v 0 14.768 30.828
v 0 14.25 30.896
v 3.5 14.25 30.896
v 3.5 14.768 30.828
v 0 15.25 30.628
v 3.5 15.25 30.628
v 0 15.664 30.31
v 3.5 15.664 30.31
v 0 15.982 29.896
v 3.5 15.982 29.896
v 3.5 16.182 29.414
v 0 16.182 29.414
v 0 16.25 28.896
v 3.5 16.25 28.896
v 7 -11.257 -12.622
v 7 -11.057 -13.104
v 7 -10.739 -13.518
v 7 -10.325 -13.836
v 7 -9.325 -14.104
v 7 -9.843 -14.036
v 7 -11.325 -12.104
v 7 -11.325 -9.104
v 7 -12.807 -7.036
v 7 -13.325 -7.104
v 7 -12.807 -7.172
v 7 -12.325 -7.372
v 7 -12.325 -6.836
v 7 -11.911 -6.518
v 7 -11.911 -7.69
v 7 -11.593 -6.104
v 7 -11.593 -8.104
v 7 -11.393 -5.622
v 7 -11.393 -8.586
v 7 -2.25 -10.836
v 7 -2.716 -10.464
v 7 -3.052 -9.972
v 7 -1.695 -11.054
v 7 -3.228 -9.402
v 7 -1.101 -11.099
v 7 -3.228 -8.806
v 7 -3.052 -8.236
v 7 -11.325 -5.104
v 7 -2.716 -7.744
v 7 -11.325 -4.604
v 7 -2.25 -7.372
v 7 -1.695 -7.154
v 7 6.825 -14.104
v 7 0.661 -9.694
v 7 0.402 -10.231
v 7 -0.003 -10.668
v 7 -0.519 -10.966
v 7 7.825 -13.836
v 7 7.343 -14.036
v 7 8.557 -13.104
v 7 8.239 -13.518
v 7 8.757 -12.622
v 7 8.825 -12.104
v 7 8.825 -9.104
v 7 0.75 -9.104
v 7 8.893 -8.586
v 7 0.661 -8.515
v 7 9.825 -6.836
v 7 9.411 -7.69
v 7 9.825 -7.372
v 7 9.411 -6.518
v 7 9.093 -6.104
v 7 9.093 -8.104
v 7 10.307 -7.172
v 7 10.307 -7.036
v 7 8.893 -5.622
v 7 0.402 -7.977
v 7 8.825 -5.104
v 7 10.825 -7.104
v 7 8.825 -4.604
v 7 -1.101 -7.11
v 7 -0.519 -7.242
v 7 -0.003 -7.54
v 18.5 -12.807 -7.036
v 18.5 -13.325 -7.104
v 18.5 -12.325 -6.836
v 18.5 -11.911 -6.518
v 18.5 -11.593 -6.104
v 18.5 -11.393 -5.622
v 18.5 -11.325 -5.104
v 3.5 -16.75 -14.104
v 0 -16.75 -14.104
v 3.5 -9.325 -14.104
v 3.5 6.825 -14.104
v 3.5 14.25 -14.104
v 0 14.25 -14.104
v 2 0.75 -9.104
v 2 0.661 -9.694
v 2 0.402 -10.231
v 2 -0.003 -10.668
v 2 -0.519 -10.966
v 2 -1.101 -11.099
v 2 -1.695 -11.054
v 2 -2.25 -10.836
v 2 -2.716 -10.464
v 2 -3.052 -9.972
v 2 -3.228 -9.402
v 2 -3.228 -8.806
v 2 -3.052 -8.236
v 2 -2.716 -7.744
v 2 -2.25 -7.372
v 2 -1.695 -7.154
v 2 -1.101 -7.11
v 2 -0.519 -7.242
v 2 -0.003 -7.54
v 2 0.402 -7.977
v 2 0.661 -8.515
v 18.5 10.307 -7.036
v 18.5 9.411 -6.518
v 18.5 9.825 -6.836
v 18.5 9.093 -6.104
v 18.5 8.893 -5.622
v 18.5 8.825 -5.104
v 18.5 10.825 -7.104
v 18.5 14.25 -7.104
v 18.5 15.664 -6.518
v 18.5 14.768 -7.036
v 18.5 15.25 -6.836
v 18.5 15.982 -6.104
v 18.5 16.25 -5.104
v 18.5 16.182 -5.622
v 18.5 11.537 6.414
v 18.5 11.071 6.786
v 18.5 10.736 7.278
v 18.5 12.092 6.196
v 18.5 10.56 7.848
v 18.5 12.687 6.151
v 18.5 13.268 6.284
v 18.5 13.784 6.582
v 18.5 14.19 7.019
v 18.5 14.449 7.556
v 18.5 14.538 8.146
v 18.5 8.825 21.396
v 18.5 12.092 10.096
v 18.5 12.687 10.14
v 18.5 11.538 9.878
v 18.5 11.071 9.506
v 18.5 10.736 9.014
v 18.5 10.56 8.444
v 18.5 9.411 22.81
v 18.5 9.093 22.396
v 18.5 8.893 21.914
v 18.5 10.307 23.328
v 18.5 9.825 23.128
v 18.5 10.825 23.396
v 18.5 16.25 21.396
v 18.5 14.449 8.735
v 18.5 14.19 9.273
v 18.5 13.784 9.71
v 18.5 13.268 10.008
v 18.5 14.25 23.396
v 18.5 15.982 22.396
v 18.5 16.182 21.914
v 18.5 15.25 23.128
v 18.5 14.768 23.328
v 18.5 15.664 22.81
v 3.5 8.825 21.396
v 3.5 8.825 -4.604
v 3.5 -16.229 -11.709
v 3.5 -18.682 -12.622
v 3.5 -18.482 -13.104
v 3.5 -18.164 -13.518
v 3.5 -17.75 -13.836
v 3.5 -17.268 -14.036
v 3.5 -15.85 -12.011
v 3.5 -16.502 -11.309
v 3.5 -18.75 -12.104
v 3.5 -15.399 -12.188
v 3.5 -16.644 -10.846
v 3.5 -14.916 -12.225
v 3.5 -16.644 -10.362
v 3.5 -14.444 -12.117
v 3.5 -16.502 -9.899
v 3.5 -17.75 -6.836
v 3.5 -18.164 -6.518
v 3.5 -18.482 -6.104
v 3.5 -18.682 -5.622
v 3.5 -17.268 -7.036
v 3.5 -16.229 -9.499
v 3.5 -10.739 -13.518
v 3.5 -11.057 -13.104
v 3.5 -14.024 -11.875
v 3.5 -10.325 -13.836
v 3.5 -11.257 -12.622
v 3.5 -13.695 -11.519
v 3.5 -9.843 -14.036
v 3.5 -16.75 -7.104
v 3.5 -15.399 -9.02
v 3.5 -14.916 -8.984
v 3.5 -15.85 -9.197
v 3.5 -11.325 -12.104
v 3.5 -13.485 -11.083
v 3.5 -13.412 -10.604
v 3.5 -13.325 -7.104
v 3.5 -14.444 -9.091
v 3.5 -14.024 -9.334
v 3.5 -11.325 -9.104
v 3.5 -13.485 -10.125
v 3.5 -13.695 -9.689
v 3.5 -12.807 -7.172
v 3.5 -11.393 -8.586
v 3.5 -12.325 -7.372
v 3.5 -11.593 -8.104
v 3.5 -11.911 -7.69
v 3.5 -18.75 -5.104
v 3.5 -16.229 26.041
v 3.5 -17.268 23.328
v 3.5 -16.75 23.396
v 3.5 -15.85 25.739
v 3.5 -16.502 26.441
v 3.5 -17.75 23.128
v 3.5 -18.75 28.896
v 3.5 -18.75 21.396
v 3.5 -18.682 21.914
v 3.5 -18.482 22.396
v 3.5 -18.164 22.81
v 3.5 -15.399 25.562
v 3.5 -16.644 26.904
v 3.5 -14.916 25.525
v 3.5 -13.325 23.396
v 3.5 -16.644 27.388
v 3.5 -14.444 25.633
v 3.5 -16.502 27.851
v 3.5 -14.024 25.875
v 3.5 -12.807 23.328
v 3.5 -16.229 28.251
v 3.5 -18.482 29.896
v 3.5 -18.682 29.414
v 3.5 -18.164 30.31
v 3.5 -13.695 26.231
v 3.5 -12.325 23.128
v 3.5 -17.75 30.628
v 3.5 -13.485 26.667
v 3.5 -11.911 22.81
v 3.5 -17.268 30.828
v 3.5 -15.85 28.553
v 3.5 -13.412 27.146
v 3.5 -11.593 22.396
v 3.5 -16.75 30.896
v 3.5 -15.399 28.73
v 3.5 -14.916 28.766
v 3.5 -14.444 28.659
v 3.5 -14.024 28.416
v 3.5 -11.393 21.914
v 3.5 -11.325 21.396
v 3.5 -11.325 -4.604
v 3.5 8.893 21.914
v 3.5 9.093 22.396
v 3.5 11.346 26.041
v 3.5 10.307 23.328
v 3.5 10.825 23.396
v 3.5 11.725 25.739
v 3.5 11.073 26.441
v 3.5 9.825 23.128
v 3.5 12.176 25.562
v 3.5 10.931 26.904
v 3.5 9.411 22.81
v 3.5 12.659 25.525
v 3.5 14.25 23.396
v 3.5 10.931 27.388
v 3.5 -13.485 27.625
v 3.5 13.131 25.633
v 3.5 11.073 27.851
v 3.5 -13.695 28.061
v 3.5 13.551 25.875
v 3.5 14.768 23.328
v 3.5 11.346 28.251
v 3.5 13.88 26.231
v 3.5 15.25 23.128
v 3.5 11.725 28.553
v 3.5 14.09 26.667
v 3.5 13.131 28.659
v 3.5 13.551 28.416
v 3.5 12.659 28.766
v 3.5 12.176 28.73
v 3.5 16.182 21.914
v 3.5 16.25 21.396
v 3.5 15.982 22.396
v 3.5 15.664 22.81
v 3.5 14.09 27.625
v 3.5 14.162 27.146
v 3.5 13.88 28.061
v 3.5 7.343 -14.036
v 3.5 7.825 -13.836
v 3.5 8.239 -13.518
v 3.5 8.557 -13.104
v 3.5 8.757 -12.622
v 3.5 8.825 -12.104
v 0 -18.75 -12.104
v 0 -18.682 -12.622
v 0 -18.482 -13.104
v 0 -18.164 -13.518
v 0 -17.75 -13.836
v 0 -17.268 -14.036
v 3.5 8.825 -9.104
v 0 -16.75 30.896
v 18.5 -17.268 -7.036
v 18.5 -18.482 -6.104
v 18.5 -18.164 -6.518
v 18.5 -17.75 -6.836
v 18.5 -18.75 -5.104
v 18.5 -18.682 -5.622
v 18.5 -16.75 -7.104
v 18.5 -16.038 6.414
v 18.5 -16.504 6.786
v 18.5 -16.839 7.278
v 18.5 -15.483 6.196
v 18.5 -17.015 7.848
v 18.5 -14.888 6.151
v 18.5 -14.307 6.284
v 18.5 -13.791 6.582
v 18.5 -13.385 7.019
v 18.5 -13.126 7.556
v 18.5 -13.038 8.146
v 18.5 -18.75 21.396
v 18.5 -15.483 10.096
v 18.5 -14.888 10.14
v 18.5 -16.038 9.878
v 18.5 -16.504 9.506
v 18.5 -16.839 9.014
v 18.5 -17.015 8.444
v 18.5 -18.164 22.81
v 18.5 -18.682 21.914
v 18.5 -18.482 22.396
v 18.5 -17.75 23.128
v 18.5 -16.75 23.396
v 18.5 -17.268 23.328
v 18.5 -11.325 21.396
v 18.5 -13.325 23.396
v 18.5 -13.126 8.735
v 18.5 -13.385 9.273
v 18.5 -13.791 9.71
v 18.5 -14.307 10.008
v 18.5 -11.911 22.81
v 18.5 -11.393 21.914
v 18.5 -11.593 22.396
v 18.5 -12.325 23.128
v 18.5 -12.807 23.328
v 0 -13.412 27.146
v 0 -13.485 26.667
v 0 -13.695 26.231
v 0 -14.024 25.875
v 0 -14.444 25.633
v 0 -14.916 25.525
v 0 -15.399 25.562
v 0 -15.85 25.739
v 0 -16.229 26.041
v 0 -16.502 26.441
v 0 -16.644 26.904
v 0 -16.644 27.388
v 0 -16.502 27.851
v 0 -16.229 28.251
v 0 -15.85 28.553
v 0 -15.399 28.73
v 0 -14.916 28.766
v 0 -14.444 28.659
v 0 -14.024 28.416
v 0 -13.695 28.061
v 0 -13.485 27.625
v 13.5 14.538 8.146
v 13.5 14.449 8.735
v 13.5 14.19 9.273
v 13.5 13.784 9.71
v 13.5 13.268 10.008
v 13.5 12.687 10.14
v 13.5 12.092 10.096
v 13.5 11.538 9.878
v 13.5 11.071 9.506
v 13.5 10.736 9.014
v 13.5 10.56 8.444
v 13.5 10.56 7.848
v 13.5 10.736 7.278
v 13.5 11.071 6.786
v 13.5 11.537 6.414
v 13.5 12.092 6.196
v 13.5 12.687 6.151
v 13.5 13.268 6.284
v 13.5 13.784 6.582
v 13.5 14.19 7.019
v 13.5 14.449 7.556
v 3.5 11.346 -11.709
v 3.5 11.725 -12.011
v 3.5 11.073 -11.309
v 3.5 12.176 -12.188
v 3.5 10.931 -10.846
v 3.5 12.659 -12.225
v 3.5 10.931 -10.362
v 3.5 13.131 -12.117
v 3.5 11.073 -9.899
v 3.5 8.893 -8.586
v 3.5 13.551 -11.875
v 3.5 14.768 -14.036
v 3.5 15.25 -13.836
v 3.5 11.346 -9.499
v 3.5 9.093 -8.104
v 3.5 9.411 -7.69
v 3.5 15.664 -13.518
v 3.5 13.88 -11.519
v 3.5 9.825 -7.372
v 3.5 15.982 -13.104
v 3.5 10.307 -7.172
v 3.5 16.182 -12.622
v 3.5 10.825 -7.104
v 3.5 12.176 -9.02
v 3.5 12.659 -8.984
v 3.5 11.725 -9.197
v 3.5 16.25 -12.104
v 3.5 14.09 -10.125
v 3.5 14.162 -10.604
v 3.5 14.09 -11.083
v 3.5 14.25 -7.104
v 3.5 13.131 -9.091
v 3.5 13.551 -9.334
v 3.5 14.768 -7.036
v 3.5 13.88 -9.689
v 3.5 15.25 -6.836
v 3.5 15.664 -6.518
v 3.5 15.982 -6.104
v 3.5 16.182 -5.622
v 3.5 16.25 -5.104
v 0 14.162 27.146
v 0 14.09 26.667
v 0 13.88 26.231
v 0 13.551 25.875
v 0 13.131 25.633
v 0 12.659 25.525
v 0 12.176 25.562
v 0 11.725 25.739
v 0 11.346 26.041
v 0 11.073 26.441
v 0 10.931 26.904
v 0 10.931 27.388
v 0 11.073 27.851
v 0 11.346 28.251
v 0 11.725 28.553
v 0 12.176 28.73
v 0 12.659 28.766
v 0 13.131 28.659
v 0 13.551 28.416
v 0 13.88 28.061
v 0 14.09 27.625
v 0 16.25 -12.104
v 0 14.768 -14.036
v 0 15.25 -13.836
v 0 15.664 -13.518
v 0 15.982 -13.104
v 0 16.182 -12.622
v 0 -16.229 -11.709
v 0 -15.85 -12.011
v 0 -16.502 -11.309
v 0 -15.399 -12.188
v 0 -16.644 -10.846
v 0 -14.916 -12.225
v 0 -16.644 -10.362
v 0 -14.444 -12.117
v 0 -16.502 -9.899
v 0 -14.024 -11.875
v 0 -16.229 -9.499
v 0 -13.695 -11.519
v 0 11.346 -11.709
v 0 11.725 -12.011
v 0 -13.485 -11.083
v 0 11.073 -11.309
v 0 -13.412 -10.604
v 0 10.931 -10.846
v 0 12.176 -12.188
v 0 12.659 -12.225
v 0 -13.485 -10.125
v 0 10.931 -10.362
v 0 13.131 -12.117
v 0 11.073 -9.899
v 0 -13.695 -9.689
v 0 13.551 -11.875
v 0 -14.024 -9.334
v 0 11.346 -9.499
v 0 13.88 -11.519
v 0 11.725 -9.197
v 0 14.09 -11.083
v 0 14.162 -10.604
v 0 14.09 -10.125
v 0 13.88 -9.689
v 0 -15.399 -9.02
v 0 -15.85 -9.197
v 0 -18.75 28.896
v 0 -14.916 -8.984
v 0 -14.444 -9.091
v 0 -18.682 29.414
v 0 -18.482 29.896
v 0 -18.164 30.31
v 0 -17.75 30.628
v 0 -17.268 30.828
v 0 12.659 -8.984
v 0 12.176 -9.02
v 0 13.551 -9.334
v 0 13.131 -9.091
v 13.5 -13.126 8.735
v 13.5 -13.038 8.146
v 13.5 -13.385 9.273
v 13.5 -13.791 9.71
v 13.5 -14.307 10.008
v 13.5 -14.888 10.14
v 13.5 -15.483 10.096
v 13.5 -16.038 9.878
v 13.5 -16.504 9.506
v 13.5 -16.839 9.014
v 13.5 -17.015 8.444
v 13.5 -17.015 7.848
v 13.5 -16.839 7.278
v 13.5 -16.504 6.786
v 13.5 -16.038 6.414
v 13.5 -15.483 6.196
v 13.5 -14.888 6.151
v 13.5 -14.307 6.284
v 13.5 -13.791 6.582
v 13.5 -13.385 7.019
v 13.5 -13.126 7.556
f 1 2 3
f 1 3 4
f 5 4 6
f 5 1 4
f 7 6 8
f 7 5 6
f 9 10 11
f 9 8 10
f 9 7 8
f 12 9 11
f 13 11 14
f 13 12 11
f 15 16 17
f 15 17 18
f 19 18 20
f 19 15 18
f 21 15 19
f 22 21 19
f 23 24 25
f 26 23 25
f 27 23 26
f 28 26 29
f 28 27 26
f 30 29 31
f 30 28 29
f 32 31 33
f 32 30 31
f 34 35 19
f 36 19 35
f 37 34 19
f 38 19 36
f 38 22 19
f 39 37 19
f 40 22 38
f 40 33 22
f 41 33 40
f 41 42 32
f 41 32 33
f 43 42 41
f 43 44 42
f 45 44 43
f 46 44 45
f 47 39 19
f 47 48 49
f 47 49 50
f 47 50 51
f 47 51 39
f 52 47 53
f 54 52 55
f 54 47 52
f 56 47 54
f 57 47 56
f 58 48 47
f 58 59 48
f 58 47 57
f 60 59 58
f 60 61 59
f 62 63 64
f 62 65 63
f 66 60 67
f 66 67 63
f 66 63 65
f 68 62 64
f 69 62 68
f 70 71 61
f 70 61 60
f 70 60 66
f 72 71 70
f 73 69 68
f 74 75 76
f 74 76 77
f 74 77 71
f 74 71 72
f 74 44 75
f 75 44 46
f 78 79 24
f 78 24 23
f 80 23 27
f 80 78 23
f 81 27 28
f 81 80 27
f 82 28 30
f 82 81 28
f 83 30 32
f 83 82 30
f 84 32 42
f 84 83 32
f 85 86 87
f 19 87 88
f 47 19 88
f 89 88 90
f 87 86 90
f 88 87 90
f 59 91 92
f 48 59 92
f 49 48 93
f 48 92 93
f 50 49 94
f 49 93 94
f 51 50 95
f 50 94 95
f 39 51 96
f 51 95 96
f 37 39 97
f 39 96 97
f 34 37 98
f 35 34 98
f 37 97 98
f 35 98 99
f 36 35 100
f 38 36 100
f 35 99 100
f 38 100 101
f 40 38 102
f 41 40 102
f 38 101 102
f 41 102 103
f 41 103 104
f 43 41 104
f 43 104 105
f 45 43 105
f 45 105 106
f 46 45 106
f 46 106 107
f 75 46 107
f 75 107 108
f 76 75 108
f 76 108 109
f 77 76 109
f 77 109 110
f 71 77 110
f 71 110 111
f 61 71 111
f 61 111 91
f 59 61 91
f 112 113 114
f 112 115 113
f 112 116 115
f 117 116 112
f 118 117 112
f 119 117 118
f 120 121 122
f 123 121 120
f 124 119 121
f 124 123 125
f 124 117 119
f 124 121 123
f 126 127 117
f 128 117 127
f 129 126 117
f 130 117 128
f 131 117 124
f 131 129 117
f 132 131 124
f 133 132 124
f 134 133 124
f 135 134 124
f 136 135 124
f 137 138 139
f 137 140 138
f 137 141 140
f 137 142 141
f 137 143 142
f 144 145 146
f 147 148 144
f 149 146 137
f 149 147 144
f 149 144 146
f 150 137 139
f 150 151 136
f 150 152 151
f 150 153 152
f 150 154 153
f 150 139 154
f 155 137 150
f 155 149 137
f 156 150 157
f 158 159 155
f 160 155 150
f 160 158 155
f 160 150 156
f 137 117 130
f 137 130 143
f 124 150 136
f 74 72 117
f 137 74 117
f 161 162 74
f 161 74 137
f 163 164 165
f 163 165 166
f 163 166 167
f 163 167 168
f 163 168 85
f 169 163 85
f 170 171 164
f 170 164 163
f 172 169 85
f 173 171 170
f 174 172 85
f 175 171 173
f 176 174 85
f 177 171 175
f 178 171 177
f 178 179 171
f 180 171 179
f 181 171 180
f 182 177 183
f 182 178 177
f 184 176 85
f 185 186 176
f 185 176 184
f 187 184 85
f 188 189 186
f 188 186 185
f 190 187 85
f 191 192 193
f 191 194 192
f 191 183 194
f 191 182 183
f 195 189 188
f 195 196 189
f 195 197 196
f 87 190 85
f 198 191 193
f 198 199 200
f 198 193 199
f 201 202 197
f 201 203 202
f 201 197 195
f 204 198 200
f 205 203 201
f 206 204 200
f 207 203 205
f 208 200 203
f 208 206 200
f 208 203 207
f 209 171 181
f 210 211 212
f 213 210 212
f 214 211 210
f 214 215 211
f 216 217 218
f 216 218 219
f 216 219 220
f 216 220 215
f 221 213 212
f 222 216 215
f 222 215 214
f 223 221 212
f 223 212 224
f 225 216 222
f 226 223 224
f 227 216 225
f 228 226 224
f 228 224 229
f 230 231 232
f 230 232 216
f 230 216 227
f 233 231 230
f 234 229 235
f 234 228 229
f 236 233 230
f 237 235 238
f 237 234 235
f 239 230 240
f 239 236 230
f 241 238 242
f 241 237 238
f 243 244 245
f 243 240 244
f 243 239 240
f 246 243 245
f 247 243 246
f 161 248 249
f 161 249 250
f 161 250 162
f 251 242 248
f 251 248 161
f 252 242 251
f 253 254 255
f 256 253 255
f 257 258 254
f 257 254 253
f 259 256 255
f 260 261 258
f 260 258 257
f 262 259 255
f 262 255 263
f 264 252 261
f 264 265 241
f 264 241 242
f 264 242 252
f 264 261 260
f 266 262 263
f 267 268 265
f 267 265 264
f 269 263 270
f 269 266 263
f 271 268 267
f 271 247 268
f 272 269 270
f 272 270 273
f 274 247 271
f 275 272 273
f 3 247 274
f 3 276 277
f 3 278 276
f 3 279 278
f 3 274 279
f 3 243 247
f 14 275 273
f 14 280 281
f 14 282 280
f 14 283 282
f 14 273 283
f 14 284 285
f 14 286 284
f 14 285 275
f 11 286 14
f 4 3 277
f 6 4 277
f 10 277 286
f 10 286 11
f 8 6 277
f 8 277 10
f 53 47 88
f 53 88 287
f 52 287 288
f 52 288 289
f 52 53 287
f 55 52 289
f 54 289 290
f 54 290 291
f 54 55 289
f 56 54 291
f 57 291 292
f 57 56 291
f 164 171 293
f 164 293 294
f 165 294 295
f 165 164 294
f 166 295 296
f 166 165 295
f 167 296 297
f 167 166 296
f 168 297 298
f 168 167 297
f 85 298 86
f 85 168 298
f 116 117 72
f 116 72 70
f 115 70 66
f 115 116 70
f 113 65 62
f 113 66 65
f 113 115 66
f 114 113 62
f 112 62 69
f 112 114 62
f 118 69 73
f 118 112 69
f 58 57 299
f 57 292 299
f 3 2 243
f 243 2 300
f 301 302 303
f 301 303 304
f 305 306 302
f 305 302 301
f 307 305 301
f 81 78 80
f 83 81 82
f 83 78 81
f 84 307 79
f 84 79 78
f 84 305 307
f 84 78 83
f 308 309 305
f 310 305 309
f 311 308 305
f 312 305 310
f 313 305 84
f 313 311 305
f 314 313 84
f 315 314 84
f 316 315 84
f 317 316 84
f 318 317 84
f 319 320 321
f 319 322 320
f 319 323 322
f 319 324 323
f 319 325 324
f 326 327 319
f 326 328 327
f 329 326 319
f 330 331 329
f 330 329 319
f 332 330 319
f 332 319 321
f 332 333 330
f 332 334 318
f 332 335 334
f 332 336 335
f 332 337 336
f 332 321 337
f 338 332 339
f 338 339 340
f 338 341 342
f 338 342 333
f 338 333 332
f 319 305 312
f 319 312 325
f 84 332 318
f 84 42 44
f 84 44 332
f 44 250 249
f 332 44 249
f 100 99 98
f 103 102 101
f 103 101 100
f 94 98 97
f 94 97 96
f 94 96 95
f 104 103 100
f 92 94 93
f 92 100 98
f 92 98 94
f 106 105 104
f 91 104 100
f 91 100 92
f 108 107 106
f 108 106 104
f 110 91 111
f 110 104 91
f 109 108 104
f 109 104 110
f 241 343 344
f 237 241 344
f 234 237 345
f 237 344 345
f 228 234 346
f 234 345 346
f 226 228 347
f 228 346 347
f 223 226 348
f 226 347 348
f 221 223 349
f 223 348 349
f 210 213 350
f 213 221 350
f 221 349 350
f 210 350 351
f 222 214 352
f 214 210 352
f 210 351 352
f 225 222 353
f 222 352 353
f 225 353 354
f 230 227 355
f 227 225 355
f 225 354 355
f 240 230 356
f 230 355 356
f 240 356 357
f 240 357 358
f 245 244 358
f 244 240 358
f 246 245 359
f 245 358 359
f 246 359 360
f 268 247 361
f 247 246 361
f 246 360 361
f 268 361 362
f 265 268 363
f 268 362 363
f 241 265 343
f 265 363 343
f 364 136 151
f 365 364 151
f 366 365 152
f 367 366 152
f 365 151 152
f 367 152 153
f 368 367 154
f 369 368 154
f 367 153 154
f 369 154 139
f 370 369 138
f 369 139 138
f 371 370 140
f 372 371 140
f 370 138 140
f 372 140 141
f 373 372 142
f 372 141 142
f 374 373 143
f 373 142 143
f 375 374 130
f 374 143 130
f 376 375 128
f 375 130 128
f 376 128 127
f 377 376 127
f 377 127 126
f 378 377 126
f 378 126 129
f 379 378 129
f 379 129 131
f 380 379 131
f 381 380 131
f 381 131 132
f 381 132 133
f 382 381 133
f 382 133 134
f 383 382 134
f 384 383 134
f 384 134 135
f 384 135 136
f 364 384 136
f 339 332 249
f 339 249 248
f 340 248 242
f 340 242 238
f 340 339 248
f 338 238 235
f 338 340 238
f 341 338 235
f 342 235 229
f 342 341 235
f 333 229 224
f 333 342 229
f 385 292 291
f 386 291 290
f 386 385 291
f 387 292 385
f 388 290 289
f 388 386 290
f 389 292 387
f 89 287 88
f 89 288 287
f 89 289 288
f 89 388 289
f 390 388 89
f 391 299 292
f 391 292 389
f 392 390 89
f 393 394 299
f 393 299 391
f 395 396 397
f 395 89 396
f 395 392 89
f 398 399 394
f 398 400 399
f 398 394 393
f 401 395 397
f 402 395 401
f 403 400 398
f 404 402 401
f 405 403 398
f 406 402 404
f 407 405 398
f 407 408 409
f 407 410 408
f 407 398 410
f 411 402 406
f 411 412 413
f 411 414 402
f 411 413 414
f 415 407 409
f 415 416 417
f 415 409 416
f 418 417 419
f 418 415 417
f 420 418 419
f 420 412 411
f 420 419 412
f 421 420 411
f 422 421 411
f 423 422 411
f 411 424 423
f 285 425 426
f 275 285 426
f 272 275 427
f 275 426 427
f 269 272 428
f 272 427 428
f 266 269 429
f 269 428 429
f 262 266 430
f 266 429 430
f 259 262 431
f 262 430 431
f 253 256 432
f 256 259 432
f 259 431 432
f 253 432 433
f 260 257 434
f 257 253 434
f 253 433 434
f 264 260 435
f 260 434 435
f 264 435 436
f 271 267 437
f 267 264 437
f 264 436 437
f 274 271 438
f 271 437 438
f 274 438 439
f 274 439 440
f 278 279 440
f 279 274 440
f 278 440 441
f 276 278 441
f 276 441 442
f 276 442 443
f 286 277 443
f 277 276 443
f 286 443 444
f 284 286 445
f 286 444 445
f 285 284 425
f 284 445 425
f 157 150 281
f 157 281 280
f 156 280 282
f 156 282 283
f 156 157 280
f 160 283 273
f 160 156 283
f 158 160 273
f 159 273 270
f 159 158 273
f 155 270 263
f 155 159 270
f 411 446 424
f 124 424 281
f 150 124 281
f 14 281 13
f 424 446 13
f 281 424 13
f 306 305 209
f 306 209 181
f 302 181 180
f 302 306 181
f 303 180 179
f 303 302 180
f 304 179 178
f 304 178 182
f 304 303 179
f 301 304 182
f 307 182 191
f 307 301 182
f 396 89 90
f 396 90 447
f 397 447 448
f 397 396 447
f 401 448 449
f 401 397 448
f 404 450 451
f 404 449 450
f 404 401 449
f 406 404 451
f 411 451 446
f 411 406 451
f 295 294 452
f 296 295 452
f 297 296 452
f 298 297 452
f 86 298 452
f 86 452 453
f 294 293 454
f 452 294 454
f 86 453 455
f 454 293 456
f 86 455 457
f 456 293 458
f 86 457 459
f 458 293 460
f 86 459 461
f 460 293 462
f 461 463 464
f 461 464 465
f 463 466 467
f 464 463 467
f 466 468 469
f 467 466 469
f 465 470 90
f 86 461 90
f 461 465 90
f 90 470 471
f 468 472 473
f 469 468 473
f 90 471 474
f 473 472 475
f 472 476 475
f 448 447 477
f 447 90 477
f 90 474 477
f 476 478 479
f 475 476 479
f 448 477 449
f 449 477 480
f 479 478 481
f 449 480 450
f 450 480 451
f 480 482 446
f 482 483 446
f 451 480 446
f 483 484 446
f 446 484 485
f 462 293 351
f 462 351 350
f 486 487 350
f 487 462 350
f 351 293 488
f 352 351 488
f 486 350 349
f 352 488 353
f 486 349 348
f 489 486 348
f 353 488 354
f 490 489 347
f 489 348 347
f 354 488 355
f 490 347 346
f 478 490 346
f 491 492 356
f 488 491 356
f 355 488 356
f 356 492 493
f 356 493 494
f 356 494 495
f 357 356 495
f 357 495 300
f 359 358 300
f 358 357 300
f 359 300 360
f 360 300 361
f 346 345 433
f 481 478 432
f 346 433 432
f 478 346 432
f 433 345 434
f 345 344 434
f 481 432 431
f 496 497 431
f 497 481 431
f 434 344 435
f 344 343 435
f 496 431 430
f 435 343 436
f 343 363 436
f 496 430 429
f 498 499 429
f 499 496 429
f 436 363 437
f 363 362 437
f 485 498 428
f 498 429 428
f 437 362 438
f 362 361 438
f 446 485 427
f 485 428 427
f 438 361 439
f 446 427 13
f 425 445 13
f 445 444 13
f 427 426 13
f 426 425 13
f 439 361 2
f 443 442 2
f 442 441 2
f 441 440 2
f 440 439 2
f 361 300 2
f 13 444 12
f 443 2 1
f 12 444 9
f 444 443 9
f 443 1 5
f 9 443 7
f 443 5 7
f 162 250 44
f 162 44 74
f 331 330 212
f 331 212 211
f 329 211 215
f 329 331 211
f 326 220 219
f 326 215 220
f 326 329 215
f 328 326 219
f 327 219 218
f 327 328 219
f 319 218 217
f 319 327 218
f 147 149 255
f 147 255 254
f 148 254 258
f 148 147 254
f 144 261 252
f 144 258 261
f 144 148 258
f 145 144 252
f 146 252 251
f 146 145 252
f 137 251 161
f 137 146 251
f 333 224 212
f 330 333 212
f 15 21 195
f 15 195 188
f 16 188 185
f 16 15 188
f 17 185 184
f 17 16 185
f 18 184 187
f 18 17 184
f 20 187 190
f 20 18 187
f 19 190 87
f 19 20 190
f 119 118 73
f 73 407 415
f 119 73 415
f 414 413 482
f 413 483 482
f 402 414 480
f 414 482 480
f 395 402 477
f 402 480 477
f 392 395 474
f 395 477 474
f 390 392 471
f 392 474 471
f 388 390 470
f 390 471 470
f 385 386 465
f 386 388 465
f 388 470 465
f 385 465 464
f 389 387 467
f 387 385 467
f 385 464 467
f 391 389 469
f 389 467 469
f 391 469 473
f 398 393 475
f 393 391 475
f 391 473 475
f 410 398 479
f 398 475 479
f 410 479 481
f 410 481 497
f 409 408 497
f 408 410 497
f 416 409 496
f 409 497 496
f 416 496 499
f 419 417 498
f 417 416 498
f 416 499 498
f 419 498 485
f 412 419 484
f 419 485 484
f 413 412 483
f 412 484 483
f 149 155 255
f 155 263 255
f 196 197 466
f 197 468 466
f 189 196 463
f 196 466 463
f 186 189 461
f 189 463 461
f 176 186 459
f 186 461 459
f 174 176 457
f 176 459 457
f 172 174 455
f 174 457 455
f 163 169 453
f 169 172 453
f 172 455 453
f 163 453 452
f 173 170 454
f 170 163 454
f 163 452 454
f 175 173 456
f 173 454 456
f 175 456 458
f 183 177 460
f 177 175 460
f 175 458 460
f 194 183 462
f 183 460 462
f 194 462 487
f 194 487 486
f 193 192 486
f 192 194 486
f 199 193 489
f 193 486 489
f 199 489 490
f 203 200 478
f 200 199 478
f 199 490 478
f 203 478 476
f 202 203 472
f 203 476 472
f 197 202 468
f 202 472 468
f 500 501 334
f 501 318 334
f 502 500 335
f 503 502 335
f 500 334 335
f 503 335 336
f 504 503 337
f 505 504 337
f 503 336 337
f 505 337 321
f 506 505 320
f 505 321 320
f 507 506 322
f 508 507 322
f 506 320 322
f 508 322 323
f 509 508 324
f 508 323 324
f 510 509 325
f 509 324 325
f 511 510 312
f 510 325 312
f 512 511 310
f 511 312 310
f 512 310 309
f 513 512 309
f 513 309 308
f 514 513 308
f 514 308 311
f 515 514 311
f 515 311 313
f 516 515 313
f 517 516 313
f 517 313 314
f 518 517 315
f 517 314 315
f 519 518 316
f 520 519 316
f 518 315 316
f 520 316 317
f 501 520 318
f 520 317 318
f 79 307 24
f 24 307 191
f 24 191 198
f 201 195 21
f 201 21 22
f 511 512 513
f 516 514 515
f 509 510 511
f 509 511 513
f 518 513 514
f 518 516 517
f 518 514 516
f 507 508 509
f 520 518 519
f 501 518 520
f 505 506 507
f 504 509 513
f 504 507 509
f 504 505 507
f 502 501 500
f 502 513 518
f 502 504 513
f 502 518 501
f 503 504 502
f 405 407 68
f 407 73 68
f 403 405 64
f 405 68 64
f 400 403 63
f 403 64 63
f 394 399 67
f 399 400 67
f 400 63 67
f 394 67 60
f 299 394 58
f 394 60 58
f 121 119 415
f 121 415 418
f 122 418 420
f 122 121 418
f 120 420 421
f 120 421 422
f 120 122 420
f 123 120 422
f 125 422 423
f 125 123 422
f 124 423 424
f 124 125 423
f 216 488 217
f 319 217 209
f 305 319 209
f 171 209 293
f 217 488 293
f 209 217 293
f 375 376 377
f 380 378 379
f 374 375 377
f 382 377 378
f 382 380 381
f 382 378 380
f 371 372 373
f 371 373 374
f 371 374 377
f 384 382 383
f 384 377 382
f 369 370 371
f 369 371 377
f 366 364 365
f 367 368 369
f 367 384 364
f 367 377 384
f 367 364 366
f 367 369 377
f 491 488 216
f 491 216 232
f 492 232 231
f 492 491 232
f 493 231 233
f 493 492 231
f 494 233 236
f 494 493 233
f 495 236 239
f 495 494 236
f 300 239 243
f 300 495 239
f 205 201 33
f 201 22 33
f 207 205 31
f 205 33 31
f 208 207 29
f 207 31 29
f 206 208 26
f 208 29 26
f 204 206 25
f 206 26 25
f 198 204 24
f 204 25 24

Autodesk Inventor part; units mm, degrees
ref_plane "YZ Plane" through (0, 0, 0) normal (1, 0, 0) x (0, 1, 0)
ref_plane "XZ Plane" through (0, 0, 0) normal (0, 1, 0) x (-1, 0, 0)
ref_plane "XY Plane" through (0, 0, 0) normal (0, 0, 1) x (1, 0, 0)
sketch "Sketch1" plane through (0, 16.25, -25.5) normal (1, 0, 0) x (0, 1, 0)
  line L0 (-35, 11.3959) -> (0, 11.3959)
  line L1 (0, 11.3959) -> (0, 48.8959)
  line L2 (0, 48.8959) -> (-35, 48.8959)
  line L3 (-35, 48.8959) -> (-35, 11.3959)
  line L4 (-17.5, 1.3959) -> (0, 1.3959)
  line L5 (-35, 48.8959) -> (0, 11.3959) construction
  line L6 (-35, 11.3959) -> (0, 48.8959) construction
  line L7 (-17.5, 53) -> (-17.5, 1.3959)
  circle A0 centre (-17.5, 16.3959) radius 2
  line L8 (-35, 30.1459) -> (0, 30.1459)
  line L9 (0, 30.1459) -> (0, 48.8959)
  line L10 (0, 48.8959) -> (-35, 48.8959)
  line L11 (-35, 48.8959) -> (-35, 30.1459)
  line L12 (-35, 11.3959) -> (-27.575, 11.3959)
  line L13 (-27.575, 11.3959) -> (-27.575, 48.8959)
  line L14 (-27.575, 48.8959) -> (-35, 48.8959)
  line L15 (-35, 48.8959) -> (-35, 11.3959)
  line L16 (0, 11.3959) -> (-7.425, 11.3959)
  line L17 (-7.425, 11.3959) -> (-7.425, 48.8959)
  line L18 (-7.425, 48.8959) -> (0, 48.8959)
  line L19 (0, 48.8959) -> (0, 11.3959)
  line L20 (0, 1.3959) -> (0, 49)
  line L21 (0, 31.3959) -> (0, 11.3959)
  line L22 (0, 11.3959) -> (0, 11.3959)
  line L23 (0, 11.3959) -> (0, 48.8959)
  line L24 (-35, 20.8959) -> (0, 20.8959)
  line L25 (-35, 18.3959) -> (-27.575, 18.3959)
  line L26 (-7.425, 18.3959) -> (0, 18.3959)
  line L27 (-35, 18.3959) -> (-27.575, 11.3959) construction
  line L28 (-35, 11.3959) -> (-27.575, 18.3959) construction
  circle A1 centre (-31.2875, 14.8959) radius 1.625
  line L29 (-7.425, 11.3959) -> (0, 18.3959) construction
  line L30 (0, 11.3959) -> (-7.425, 18.3959) construction
  circle A2 centre (-3.7125, 14.8959) radius 1.625
  line L31 (-35, 48.8959) -> (-27.575, 48.8959)
  line L32 (-27.575, 48.8959) -> (-27.575, 56.3959)
  line L33 (-27.575, 56.3959) -> (-35, 56.3959)
  line L34 (-35, 56.3959) -> (-35, 48.8959)
  line L35 (0, 48.8959) -> (-7.425, 48.8959)
  line L36 (-7.425, 48.8959) -> (-7.425, 56.3959)
  line L37 (-7.425, 56.3959) -> (0, 56.3959)
  line L38 (0, 56.3959) -> (0, 48.8959)
  line L39 (-35, 48.8959) -> (-27.575, 56.3959) construction
  line L40 (-35, 56.3959) -> (-27.575, 48.8959) construction
  line L41 (-7.425, 48.8959) -> (0, 56.3959) construction
  line L42 (-7.425, 56.3959) -> (0, 48.8959) construction
  circle A3 centre (-3.7125, 52.6459) radius 1.625
  circle A4 centre (-31.2875, 52.6459) radius 1.625
  circle A5 centre (-31.2875, 33.6459) radius 2
  circle A6 centre (-3.7125, 33.6459) radius 2
  line L43 (-27.575, 18.3959) -> (-35, 48.8959) construction
  line L44 (-35, 18.3959) -> (-27.575, 48.8959) construction
  line L45 (-27.575, 48.8959) -> (-7.425, 48.8959)
  line L46 (-7.425, 48.8959) -> (-7.425, 56.3959)
  line L47 (-7.425, 56.3959) -> (-27.575, 56.3959)
  line L48 (-27.575, 56.3959) -> (-27.575, 48.8959)
  point P0 (-17.5, 48.8959)
  point P1 (-17.5, 30.1459)
  point P2 (-1.25, 11.3959)
  point P3 (-27.575, 48.8959)
  point P4 (-27.575, 30.1459)
  point P5 (-7.425, 30.1459)
  point P6 (-7.425, 48.8959)
  point P7 (-7.425, 11.3959)
  point P8 (-27.575, 11.3959)
  point P9 (-17.5, 48.8959)
  point P10 (-17.5, 11.3959)
  point P11 (-1.25, 11.3959)
  point P12 (-7.425, 20.8959)
  point P13 (-27.575, 20.8959)
  point P14 (0, 20.8959)
  point P15 (-35, 20.8959)
  point P16 (-35, 18.3959)
  point P17 (0, 18.3959)
  point P18 (0, 48.8959)
  point P19 (-7.425, 48.8959)
  point P20 (0, 48.8959)
  point P21 (-3.7125, 14.8959)
  point P22 (-27.575, 48.8959)
  point P23 (-7.425, 48.8959)
  point P24 (0, 11.3959)
  point P25 (0, 48.8959)
  dimension "d5" = 37.5
  dimension "d3" = 10
  dimension "d4" = 35
  dimension "d2" = 4
  dimension "d18" = 5
  dimension "d19" = 4.5
  dimension "d20" = 2.5
  dimension "d21" = 3.25
  dimension "d23" = 7.5
  dimension "d24" = 4
  dimension "d25" = 4
  dimension "d29" = 7.5
  dimension "d30" = 20.15
extrude "Extrusion1" add sketch "Sketch1" along normal blind 2 contours L3 L25 L13 L0 | L13 L24 L7 A0 L0 | L3 L24 L13 L25 | L7 A0 L24 L17 L0 | L3 L8 L13 L24 | L17 L26 L1 L0 | A0 L7 | L7 A0 | L13 L8 L7 L24 | L3 L2 L13 L8 | L17 L24 L1 L26 | L13 L2 L7 L8 | L7 L8 L17 L24 | L34 L33 L32 L2 | L17 L8 L1 L24 | L7 L2 L17 L8 | L32 L47 L36 L2 | L17 L2 L1 L8 | L36 L37 L38 L20 L2 | A5 | A6
extrude "Extrusion2" add sketch "Sketch1" along normal blind 1.5 from surface at 2 contours L3 L25 L13 L0 | L13 L24 L7 A0 L0 | L3 L24 L13 L25 | L7 A0 L24 L17 L0 | L3 L8 L13 L24 | L17 L26 L1 L0 | L13 L8 L7 L24 | L3 L2 L13 L8 | L17 L24 L1 L26 | L13 L2 L7 L8 | L7 L8 L17 L24 | L34 L33 L32 L2 | L17 L8 L1 L24 | L7 L2 L17 L8 | L32 L47 L36 L2 | L17 L2 L1 L8 | L36 L37 L38 L20 L2 | A5 | A6
extrude "Extrusion3" add sketch "Sketch1" along normal blind 3.5 from surface at 3.5 contours L13 L24 L7 A0 L0 | L7 A0 L24 L17 L0
extrude "Extrusion4" add sketch "Sketch1" along normal blind 15 from surface at 3.5 contours L3 L24 L13 L25 | L3 L8 L13 L24 | L3 L2 L13 L8 | L17 L24 L1 L26 | L17 L8 L1 L24 | L17 L2 L1 L8 | A5 | A6
fillet "Fillet1" radius 2 16 edges at (1.75, -18.75, -14.1041) (11, -18.75, -7.1041) (5.25, -11.325, -7.1041) (12.75, -11.325, -7.1041) (5.25, -11.325, -14.1041) (5.25, 8.825, -14.1041) (5.25, 8.825, -7.1041) (12.75, 8.825, -7.1041) (11, 16.25, -7.1041) (11, -11.325, 23.3959) (11, 8.825, 23.3959) (1.75, -18.75, 30.8959) (11, -18.75, 23.3959) (11, 16.25, 23.3959) (1.75, 16.25, 30.8959) (1.75, 16.25, -14.1041)
extrude "Extrusion5" cut sketch "Sketch1" against normal blind 5 from surface at 18.5 contours A5 | A6
properties part number "MotorMount"
